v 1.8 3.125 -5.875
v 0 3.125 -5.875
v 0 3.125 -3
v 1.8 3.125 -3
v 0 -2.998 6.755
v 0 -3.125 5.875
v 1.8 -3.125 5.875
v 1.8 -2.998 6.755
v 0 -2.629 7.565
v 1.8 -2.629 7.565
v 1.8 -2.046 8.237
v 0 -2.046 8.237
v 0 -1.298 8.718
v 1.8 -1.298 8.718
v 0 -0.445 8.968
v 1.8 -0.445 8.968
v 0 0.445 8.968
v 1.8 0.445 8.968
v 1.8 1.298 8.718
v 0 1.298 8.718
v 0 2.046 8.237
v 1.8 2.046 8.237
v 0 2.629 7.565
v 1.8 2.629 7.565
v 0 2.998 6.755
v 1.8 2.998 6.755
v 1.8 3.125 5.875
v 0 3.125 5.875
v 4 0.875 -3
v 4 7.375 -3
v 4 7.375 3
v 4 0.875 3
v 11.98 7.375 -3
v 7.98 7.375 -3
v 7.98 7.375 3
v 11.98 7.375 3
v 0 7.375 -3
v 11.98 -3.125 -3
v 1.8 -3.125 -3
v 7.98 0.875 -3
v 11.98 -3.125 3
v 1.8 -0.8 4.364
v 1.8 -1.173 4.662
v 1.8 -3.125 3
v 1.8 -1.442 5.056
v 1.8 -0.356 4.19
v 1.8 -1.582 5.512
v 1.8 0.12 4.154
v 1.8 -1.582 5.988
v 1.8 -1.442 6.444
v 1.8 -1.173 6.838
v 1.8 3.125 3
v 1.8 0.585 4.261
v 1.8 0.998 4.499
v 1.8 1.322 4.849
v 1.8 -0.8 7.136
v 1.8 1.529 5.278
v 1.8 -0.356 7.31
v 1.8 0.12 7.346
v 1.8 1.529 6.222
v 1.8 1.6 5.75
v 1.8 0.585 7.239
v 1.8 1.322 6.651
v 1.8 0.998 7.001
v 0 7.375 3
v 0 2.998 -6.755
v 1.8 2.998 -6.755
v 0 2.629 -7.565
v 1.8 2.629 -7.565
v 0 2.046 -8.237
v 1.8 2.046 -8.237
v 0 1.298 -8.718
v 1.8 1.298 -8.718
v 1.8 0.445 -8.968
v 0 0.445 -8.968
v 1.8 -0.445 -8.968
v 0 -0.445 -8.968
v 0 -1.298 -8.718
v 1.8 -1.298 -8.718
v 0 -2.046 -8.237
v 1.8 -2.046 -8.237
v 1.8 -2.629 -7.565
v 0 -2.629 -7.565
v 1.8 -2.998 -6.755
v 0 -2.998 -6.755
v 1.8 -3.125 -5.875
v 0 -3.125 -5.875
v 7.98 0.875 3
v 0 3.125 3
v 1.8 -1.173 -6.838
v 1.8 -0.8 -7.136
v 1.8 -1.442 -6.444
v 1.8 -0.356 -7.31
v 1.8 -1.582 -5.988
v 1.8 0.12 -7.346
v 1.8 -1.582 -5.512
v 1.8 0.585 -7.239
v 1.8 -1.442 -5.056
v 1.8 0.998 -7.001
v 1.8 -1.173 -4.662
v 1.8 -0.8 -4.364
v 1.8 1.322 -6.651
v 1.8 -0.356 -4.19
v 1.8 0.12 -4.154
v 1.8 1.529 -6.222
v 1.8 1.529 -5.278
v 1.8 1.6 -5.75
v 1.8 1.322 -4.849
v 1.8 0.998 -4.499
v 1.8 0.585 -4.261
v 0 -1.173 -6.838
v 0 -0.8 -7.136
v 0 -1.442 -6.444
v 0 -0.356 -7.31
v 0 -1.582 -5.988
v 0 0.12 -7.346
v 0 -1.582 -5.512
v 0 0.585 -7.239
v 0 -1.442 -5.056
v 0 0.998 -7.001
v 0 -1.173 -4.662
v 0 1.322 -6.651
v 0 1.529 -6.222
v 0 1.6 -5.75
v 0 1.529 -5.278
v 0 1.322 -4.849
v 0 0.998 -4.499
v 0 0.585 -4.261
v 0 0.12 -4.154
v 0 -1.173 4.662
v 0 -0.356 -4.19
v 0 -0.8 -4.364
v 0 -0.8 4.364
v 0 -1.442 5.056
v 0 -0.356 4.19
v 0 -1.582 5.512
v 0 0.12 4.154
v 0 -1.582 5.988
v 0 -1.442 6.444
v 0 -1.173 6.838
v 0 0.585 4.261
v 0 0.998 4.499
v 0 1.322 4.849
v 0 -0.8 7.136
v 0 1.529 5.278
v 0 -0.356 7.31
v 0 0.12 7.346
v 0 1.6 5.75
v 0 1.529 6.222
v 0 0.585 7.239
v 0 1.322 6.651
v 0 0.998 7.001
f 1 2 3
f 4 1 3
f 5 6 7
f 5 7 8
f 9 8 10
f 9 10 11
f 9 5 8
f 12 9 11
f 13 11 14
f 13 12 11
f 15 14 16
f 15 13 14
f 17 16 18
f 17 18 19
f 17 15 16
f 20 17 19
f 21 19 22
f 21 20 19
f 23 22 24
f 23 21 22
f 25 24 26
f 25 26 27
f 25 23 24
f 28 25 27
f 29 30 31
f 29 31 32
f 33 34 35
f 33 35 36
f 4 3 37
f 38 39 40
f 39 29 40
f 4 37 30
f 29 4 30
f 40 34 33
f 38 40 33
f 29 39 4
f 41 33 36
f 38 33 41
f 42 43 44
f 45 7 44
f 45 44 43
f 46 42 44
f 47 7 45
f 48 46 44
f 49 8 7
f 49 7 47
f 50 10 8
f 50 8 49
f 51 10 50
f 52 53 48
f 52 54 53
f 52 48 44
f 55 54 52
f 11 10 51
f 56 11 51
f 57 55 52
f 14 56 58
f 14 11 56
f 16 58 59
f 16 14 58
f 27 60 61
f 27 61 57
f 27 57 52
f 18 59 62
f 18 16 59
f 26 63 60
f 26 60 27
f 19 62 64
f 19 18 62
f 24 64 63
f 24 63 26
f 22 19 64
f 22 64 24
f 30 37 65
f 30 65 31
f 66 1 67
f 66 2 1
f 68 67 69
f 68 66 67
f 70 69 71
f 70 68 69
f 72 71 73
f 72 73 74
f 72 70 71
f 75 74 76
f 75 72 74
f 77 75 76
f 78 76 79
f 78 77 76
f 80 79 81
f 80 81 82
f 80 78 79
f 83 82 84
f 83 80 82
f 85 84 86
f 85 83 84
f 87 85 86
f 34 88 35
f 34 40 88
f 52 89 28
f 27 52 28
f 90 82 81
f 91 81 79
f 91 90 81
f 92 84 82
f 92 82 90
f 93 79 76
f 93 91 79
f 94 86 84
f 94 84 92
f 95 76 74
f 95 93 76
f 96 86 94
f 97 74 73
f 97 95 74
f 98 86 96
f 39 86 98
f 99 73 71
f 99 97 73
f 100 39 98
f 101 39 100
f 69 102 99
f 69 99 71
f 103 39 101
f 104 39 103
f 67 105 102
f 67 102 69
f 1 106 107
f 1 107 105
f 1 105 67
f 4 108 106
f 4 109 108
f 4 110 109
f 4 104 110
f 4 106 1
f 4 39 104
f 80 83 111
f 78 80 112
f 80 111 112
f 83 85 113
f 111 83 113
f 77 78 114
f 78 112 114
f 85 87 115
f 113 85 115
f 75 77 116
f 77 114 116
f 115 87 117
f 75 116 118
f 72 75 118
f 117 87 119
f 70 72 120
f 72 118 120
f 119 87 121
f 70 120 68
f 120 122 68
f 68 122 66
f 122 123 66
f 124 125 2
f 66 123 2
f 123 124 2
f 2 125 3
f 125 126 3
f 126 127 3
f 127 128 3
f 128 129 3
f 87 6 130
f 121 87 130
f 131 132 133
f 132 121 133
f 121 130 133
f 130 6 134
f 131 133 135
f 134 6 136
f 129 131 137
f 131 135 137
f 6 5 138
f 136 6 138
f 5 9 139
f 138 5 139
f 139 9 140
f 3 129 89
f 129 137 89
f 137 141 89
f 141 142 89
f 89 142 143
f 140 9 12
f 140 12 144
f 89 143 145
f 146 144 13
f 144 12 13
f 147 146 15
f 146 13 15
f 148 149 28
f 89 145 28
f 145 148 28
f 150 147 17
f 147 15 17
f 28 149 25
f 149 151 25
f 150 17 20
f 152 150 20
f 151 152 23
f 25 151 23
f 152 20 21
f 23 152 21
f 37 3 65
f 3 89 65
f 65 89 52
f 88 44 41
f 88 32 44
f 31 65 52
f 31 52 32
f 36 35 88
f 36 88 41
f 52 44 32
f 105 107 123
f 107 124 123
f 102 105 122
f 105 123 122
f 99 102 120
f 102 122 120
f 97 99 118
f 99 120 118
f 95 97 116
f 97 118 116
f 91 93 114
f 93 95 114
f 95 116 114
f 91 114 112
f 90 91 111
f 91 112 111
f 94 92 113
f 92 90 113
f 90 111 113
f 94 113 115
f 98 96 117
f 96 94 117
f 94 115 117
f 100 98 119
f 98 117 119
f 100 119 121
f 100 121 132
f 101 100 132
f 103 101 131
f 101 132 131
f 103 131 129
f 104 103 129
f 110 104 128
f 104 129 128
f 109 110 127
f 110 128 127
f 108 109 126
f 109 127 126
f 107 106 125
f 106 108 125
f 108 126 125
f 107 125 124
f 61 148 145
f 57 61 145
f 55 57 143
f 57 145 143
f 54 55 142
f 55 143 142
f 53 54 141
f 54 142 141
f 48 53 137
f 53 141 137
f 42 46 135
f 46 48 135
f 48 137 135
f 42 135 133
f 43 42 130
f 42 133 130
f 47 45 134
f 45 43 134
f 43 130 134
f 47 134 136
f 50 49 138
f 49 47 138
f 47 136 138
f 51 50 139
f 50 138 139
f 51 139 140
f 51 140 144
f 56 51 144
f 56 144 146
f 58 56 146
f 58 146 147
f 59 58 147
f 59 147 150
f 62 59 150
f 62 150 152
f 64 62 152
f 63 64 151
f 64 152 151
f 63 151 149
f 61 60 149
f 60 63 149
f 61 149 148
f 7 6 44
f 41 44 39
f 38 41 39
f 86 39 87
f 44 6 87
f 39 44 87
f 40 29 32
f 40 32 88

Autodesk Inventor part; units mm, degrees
ref_plane "YZ Plane" through (0, 0, 0) normal (1, 0, 0) x (0, 1, 0)
ref_plane "XZ Plane" through (0, 0, 0) normal (0, 1, 0) x (-1, 0, 0)
ref_plane "XY Plane" through (0, 0, 0) normal (0, 0, 1) x (1, 0, 0)
sketch "草圖1" plane through (0, 0, 0) normal (1, 0, 0) x (0, 1, 0)
  line L0 (0, 9) -> (0, 9)
  line L1 (-3.125, 5.875) -> (-3.125, -5.875)
  line L2 (0, -9) -> (0, -9)
  line L3 (3.125, -5.875) -> (3.125, 5.875)
  line L4 (3.125, 9) -> (-3.125, -9) construction
  line L5 (-3.125, 9) -> (3.125, -9) construction
  circle A0 centre (0, 5.75) radius 1.6
  circle A1 centre (0, -5.75) radius 1.6
  arc A2 (0, -9) -> (3.125, -5.875) centre (0, -5.875) ccw
  arc A3 (-3.125, -5.875) -> (0, -9) centre (0, -5.875) ccw
  arc A4 (0, 9) -> (-3.125, 5.875) centre (0, 5.875) ccw
  arc A5 (3.125, 5.875) -> (0, 9) centre (0, 5.875) ccw
  point P0 (0, 0)
  point P1 (0, 0)
  point P2 (0, -9)
  point P3 (0, 9)
  dimension "d2" = 6.25
  dimension "d3" = 18
  dimension "d4" = 3.2
  dimension "d5" = 3.2
  dimension "d6" = 11.5
  dimension "d7" = 5.75
  dimension "d8" = 3.125
  dimension "d9" = 3.125
extrude "擠出1" add sketch "草圖1" along normal blind 1.8
sketch "草圖2" plane through (0, 0, 0) normal (0, 0, 1) x (1, 0, 0)
  line L0 (0, -3.125) -> (0, 3.125) projected
  line L1 (0, -3.125) -> (0, 7.375)
  line L2 (0, 7.375) -> (4, 7.375)
  line L3 (4, 7.375) -> (4, 0.875)
  line L4 (4, 0.875) -> (7.98, 0.875)
  line L5 (7.98, 0.875) -> (7.98, 7.375)
  line L6 (7.98, 7.375) -> (11.98, 7.375)
  line L7 (11.98, 7.375) -> (11.98, -3.125)
  line L8 (11.98, -3.125) -> (0, -3.125)
  point P0 (0, 0)
  dimension "d12" = 10.5
  dimension "d13" = 4
  dimension "d14" = 3.98
  dimension "d15" = 4
  dimension "d16" = 6.5
extrude "擠出2" add sketch "草圖2" along normal mid plane 6
equation "\"d7\" = 0.5 * d6"
properties part number "TP806 optic endstop"
